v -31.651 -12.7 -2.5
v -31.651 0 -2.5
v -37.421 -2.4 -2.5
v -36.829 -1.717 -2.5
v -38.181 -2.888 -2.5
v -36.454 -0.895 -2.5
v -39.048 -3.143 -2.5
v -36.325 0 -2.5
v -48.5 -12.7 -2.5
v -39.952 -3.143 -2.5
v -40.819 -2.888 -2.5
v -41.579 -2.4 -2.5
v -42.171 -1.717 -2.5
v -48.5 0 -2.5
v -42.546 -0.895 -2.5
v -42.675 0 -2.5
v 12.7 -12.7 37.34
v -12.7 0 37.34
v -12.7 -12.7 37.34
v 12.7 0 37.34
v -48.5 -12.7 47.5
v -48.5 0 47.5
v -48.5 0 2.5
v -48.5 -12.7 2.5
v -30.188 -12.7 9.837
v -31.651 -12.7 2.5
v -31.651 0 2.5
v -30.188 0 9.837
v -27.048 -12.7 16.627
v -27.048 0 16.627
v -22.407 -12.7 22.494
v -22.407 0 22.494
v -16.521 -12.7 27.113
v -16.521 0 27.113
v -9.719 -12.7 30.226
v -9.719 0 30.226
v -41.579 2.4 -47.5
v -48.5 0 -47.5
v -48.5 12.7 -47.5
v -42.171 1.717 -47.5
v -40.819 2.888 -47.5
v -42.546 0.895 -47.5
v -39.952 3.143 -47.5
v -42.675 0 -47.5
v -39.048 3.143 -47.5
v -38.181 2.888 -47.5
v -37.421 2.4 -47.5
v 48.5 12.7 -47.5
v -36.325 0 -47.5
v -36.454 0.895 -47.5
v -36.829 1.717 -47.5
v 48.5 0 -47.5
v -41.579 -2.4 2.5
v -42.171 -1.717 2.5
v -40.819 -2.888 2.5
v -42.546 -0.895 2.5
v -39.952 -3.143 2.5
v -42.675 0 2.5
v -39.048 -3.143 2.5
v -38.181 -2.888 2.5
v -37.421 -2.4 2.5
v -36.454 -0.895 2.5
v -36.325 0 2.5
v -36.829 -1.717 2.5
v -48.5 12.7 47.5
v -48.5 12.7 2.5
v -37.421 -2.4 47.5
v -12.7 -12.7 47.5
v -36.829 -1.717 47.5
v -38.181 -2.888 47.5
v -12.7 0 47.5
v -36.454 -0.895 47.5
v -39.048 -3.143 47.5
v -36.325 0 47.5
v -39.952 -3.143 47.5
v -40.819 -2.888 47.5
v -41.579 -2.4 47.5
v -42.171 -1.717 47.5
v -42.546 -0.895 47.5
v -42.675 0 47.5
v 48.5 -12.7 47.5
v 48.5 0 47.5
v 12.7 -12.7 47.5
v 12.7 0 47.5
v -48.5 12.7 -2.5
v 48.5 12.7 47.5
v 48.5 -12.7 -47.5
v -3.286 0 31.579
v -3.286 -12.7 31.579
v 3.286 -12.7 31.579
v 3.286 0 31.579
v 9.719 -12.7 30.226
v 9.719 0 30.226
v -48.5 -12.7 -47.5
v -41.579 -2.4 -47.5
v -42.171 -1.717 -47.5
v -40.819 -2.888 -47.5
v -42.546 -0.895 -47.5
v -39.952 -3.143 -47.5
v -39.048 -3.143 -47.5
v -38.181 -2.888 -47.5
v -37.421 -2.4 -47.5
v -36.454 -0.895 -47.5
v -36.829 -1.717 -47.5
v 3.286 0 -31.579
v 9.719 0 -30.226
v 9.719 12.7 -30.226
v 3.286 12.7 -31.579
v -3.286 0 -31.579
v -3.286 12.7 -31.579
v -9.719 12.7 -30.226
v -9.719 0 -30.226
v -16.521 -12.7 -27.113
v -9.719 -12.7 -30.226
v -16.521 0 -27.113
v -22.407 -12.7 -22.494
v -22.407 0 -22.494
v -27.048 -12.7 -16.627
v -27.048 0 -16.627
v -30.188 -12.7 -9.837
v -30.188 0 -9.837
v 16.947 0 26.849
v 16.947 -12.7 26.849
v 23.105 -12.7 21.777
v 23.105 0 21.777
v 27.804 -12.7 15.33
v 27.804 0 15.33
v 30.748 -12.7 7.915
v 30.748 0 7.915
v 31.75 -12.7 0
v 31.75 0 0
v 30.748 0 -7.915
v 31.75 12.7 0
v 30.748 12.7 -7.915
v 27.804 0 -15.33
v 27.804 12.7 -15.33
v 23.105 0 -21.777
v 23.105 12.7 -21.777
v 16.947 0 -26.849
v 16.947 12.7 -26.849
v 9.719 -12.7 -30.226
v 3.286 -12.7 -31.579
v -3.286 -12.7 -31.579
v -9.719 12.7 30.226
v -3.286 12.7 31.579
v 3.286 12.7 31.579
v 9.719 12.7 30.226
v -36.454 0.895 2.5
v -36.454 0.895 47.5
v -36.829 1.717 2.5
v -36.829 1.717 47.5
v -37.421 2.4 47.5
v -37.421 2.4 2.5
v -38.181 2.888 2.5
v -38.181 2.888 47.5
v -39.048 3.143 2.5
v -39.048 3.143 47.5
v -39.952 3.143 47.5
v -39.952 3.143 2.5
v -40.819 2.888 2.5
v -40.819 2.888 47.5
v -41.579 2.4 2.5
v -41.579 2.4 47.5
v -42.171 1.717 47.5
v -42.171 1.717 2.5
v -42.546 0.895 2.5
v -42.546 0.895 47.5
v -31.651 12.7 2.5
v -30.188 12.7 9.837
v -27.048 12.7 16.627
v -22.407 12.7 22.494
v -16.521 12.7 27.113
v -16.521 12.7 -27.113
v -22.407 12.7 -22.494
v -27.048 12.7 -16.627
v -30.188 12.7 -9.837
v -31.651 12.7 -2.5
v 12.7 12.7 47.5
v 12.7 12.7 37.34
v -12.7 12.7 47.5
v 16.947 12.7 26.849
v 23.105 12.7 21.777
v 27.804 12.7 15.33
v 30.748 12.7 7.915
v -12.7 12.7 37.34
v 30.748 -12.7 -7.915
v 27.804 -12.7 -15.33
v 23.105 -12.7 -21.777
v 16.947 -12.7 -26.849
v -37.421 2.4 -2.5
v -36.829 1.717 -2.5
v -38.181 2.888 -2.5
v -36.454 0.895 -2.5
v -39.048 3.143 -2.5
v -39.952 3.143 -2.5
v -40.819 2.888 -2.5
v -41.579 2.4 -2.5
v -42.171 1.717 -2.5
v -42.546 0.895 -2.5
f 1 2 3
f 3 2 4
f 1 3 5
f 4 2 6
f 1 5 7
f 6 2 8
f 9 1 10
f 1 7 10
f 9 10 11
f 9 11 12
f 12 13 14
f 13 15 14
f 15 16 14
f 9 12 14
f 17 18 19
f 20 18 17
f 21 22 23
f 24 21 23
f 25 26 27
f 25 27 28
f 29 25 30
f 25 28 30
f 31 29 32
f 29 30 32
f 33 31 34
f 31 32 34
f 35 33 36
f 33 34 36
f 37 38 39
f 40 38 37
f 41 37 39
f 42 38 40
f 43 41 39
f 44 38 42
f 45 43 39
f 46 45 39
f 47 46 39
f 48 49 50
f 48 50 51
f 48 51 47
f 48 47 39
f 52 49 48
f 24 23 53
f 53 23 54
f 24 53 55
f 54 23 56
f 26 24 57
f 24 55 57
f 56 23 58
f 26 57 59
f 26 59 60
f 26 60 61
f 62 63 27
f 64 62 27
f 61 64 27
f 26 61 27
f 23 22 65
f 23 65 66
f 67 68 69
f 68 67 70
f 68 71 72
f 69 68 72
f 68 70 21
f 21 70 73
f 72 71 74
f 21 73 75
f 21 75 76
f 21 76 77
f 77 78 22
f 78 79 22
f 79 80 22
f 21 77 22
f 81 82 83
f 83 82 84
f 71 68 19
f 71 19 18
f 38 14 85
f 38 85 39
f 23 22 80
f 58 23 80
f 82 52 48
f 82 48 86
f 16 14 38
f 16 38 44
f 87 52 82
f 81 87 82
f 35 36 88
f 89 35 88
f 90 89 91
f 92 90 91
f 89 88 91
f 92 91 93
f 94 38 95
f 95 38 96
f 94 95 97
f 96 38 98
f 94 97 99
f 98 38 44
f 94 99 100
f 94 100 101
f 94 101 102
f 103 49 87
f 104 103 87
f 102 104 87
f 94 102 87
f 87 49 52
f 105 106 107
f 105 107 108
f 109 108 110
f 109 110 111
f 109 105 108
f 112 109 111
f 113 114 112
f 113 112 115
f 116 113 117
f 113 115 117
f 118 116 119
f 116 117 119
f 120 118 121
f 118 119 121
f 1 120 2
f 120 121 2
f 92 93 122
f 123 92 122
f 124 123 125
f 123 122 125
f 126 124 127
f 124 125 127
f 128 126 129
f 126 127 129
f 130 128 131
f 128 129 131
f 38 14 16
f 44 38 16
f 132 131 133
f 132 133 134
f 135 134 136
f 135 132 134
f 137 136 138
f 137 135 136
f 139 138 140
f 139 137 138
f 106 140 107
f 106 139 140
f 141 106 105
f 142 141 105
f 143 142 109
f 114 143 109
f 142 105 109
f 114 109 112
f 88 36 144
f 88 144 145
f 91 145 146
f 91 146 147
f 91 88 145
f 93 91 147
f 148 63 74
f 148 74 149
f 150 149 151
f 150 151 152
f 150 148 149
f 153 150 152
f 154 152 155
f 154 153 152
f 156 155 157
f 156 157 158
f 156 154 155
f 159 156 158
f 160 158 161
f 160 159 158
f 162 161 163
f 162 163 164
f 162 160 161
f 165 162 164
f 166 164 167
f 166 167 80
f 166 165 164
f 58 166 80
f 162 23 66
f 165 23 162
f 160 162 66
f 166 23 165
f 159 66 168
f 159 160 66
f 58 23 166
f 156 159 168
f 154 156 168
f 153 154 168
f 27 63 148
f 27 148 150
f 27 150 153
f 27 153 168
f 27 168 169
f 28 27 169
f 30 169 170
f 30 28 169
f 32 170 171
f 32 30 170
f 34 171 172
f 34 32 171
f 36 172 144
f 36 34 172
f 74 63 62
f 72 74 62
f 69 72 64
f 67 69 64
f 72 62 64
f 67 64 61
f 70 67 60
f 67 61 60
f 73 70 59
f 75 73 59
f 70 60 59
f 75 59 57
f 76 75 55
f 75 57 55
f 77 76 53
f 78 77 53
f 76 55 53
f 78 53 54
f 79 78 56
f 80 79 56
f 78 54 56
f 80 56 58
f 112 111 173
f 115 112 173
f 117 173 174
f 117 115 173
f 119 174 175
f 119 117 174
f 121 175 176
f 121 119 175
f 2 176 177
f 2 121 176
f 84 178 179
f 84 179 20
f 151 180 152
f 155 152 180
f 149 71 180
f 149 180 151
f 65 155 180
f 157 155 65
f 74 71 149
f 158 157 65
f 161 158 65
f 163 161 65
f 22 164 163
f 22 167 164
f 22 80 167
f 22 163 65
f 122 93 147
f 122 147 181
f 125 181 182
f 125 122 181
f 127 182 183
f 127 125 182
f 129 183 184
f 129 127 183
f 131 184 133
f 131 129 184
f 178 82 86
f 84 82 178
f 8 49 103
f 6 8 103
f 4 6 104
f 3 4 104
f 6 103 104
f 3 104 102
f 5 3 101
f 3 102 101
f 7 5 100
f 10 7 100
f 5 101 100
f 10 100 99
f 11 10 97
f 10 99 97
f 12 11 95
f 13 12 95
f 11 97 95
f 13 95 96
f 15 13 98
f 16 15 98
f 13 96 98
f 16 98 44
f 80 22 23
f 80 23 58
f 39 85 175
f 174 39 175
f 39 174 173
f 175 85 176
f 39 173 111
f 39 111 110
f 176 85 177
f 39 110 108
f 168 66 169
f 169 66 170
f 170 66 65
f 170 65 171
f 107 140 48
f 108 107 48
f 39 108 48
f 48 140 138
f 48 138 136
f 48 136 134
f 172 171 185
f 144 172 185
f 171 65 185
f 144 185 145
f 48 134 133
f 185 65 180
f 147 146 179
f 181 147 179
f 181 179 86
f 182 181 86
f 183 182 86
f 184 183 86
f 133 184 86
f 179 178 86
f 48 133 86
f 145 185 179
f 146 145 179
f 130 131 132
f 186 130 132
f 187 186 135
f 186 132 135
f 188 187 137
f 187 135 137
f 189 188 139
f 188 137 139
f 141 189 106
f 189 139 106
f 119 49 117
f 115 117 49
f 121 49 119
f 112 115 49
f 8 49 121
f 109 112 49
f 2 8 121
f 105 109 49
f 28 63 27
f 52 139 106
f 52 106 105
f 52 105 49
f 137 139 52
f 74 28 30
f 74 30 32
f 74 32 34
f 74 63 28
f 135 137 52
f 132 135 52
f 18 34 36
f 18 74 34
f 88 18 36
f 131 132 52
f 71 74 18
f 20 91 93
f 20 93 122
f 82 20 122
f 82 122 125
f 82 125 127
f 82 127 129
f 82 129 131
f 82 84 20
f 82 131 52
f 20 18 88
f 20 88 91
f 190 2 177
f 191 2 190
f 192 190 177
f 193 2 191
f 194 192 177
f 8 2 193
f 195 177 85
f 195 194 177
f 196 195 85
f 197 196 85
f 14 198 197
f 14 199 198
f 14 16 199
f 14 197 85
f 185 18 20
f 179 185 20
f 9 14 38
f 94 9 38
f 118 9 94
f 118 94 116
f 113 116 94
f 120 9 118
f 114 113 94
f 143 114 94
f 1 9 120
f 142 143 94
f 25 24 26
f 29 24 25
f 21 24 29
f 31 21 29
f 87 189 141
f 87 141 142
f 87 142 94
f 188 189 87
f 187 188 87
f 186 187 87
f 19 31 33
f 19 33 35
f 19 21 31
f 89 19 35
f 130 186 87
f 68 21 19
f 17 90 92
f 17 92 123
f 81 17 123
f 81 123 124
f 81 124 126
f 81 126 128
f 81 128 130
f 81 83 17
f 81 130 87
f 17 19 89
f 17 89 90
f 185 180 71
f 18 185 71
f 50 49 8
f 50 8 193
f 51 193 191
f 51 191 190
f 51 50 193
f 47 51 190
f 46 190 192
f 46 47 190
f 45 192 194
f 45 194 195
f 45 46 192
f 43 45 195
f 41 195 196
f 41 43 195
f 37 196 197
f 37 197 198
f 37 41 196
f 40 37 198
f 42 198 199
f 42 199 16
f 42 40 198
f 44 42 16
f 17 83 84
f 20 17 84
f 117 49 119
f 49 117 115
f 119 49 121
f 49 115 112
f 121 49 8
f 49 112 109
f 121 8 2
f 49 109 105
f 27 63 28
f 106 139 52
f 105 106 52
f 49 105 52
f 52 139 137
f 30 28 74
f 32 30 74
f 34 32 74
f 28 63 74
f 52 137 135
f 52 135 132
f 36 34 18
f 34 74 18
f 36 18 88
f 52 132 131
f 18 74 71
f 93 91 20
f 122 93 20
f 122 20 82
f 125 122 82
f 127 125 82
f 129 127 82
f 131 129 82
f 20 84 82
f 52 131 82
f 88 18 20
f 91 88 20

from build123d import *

# Parameters (mm, degrees)
F1_DEPTH = 12.7
F2_W     = 25.4
F2_H     = 12.7
F3_DEPTH = 10.16
F6_D     = 6.35
F6_2_D   = 6.35


with BuildPart() as f1:
    # F0 (on Front) → F1 (new body)
    with BuildSketch(Plane.XZ):
        with BuildLine():
            ThreePointArc((-31.651422, 2.5), (-24.900857, 19.697964), (-9.718612, 30.226))
            ThreePointArc((-9.718612, 30.226), (0, 31.75), (9.718612, 30.226))
            ThreePointArc((9.718612, 30.226), (25.657635, 18.701558), (31.75, 0))
            ThreePointArc((31.75, 0), (25.657635, -18.701558), (9.718612, -30.226))
            ThreePointArc((9.718612, -30.226), (0, -31.75), (-9.718612, -30.226))
            ThreePointArc((-9.718612, -30.226), (-24.900857, -19.697964), (-31.651422, -2.5))
            Line((-31.651422, -2.5), (-48.5, -2.5))
            Line((-48.5, -2.5), (-48.5, -47.5))
            Line((-48.5, -47.5), (48.5, -47.5))
            Line((48.5, -47.5), (48.5, 47.5))
            Line((48.5, 47.5), (-48.5, 47.5))
            Line((-48.5, 47.5), (-48.5, 2.5))
            Line((-48.5, 2.5), (-31.651422, 2.5))
        make_face()
    extrude(amount=F1_DEPTH)

    # F2 (on face) → F3 (cut)
    with BuildSketch(Plane.XY.offset(47.5)):
        with Locations((0, -6.35)):
            Rectangle(F2_W, F2_H)
    extrude(amount=-F3_DEPTH, mode=Mode.SUBTRACT)

    # F6 (through all)
    with Locations(Plane.XY.offset(47.5)):
        with Locations((-39.5, 0)):
            Hole(F6_D / 2)


with BuildPart() as f4_1:
    # F4: instance of F1
    add(f1.part.mirror(Plane.XZ))

    # F6#2 (through all)
    with Locations(Plane.XY.offset(47.5)):
        with Locations((-39.5, 0)):
            Hole(F6_2_D / 2)


solid = Compound([f1.part, f4_1.part])
